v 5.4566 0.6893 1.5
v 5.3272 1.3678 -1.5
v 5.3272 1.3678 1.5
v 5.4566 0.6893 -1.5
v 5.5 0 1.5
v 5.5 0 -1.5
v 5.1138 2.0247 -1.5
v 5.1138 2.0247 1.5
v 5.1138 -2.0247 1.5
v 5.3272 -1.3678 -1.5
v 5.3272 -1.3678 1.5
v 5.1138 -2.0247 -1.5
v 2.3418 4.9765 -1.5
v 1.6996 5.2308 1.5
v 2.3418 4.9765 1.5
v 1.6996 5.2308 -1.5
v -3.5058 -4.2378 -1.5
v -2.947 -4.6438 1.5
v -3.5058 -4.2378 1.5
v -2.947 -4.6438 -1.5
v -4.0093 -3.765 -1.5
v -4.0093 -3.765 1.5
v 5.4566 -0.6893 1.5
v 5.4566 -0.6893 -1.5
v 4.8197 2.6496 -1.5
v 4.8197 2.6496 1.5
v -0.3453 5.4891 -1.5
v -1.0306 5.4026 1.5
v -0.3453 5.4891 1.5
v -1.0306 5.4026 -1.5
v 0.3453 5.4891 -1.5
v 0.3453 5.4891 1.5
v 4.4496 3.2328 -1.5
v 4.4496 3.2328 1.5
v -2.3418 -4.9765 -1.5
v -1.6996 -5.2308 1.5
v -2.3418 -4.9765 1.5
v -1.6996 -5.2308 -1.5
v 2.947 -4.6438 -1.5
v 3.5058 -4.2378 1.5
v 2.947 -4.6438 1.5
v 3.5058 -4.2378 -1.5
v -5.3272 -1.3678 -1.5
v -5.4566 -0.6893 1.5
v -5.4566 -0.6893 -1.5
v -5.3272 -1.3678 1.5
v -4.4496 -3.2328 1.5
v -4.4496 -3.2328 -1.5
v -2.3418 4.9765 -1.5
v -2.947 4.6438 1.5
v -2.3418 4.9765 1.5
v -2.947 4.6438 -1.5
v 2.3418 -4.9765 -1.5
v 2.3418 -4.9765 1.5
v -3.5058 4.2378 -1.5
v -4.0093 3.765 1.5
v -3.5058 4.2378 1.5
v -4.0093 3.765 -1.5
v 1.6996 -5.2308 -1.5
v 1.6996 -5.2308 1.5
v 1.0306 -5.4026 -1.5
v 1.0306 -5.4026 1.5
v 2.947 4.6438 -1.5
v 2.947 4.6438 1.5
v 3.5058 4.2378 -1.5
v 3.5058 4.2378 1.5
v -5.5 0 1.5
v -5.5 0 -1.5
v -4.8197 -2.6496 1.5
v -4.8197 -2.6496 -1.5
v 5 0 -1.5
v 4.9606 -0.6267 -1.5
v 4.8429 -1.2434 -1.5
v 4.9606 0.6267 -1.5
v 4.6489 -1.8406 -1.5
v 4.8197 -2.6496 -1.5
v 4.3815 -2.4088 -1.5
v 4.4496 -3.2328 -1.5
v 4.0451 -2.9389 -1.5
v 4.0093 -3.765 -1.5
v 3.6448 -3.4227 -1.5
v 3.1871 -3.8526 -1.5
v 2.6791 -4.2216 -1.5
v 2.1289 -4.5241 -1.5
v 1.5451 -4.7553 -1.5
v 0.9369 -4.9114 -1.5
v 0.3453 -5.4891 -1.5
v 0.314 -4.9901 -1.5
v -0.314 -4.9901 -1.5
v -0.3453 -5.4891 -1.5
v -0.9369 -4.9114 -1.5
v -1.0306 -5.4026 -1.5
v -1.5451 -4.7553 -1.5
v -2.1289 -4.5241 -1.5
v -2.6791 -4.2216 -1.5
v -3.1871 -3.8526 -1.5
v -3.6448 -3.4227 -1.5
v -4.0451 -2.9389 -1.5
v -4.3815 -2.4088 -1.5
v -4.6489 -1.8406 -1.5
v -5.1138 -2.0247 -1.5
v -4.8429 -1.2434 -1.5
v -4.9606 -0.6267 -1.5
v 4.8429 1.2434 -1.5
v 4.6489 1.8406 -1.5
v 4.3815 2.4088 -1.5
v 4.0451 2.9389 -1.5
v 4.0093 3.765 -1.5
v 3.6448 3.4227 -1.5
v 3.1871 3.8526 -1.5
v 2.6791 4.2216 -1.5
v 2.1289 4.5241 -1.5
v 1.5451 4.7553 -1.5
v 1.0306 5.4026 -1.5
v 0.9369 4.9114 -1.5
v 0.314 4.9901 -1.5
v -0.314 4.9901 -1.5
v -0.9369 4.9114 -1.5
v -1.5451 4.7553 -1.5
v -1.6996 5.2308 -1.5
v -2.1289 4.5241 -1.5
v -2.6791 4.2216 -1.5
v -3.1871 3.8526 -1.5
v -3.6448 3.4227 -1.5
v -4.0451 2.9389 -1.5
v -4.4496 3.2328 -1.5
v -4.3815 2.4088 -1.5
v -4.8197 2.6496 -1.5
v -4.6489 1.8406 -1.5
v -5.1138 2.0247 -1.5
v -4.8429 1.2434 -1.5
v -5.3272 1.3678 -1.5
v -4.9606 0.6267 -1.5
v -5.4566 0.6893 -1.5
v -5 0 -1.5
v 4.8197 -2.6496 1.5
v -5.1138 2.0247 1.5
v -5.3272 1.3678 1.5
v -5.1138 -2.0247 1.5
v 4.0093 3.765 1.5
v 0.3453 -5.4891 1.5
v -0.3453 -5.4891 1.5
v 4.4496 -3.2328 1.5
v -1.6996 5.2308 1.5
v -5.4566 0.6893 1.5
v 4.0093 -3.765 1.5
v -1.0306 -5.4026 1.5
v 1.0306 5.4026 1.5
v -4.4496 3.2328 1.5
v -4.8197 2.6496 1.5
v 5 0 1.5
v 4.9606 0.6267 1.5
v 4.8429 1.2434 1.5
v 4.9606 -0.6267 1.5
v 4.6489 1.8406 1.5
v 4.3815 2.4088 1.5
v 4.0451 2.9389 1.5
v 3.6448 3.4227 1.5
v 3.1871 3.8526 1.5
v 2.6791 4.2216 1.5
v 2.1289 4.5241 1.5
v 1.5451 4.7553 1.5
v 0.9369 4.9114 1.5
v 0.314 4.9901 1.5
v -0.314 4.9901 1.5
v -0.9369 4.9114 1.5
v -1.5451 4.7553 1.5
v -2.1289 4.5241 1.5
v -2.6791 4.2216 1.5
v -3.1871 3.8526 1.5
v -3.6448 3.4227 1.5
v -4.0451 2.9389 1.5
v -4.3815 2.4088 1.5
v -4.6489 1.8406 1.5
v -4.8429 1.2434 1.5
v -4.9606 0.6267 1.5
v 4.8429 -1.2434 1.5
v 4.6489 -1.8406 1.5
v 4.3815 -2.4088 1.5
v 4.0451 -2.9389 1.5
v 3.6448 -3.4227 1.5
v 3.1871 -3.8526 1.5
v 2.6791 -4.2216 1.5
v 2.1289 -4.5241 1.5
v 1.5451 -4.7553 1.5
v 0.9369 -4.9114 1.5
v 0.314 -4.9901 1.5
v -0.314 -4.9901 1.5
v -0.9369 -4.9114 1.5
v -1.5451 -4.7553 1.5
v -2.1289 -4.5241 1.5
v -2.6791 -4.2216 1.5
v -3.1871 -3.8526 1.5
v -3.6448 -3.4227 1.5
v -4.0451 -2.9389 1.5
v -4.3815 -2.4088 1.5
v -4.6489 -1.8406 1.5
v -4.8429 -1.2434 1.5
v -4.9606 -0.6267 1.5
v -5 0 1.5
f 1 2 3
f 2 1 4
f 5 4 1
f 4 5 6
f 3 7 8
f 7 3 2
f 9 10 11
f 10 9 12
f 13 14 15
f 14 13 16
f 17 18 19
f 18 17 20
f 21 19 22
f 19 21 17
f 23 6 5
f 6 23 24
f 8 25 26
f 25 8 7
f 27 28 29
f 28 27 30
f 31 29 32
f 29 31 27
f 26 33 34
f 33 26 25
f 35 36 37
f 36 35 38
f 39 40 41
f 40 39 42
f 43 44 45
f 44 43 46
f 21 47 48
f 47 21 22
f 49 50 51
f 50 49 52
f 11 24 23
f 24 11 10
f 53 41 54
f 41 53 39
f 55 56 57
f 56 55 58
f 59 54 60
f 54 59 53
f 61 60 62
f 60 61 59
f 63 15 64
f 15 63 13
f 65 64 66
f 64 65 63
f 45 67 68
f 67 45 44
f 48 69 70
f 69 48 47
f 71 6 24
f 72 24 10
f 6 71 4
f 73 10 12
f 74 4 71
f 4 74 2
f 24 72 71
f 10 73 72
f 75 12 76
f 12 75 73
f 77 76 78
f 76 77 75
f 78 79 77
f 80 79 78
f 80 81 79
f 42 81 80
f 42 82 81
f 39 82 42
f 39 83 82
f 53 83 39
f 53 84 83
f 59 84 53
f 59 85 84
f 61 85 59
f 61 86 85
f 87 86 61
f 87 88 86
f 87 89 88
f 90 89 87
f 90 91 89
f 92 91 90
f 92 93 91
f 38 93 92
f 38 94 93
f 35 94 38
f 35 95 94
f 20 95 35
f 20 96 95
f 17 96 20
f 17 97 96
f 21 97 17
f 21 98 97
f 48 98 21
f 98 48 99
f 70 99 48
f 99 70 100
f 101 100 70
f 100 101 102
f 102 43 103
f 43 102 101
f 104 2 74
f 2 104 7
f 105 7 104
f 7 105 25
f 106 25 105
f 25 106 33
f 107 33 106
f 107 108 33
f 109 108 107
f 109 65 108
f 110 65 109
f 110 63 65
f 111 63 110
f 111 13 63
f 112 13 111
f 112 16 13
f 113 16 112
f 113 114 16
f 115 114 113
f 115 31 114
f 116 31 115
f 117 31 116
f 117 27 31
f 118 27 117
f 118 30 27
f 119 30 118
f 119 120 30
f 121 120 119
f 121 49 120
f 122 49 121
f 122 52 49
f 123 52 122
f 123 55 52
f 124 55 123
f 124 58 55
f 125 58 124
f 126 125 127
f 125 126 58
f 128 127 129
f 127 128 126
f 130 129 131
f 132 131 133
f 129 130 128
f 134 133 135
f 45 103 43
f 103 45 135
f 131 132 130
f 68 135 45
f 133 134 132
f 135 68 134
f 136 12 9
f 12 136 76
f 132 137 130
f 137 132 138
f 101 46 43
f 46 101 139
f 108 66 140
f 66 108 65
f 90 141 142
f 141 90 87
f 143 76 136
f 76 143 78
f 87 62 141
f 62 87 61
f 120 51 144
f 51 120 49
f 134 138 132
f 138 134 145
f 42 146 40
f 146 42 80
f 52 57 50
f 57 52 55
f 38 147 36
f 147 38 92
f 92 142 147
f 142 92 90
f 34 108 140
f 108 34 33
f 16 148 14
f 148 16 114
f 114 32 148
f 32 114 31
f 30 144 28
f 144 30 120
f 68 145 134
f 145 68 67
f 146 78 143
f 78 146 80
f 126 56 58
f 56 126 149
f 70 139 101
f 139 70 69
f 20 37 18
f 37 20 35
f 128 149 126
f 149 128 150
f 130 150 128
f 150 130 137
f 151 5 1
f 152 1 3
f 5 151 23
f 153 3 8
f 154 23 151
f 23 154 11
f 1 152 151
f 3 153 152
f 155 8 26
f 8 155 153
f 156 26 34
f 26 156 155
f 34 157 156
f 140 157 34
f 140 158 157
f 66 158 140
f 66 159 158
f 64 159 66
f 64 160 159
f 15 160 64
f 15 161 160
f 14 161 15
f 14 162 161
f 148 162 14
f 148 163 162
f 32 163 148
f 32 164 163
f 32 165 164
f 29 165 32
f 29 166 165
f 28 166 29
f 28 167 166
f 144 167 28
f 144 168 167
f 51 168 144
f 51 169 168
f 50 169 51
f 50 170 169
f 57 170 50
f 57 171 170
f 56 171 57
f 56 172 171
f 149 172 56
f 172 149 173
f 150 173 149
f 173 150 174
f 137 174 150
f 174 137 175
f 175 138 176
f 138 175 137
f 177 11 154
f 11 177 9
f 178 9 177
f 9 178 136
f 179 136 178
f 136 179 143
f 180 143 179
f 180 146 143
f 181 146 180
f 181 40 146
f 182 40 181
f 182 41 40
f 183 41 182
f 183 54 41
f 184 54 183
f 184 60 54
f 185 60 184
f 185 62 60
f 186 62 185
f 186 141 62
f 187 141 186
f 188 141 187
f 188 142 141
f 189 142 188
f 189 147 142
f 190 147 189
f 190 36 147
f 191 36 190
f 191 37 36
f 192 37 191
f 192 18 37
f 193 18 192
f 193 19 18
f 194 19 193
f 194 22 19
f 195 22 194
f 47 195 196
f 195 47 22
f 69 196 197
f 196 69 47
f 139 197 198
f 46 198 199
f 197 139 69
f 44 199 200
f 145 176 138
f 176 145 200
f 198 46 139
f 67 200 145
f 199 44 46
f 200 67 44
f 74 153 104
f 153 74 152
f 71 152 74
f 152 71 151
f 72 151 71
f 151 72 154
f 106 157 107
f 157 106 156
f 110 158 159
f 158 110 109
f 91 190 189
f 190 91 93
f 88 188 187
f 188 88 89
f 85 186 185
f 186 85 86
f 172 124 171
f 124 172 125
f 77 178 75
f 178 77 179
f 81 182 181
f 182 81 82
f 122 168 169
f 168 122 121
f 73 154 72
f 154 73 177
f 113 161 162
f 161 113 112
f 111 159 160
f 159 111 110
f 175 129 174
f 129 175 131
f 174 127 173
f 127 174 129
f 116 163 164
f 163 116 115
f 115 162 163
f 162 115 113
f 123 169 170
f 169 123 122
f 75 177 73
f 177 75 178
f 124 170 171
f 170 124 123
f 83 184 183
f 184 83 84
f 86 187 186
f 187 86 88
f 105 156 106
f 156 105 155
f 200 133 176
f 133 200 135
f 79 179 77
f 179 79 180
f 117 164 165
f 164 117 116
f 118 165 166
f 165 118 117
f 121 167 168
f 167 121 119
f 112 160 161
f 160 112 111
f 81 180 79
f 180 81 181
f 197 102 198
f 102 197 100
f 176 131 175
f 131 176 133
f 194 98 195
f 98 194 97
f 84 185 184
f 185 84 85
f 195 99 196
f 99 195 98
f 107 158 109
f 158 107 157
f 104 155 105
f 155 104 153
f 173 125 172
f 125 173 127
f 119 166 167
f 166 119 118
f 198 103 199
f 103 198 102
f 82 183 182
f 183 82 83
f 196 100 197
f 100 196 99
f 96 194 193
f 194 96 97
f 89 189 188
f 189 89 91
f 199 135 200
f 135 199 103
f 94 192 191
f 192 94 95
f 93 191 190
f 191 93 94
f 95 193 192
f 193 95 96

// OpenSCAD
$fn = 50;


difference() {
	union() {
		translate(v = [0, 0, -1.5000000000]) {
			cylinder(h = 3, r = 5.5000000000);
		}
	}
	union() {
		translate(v = [0, 0, -100.0000000000]) {
			cylinder(h = 200, r = 5.0000000000);
		}
	}
}
